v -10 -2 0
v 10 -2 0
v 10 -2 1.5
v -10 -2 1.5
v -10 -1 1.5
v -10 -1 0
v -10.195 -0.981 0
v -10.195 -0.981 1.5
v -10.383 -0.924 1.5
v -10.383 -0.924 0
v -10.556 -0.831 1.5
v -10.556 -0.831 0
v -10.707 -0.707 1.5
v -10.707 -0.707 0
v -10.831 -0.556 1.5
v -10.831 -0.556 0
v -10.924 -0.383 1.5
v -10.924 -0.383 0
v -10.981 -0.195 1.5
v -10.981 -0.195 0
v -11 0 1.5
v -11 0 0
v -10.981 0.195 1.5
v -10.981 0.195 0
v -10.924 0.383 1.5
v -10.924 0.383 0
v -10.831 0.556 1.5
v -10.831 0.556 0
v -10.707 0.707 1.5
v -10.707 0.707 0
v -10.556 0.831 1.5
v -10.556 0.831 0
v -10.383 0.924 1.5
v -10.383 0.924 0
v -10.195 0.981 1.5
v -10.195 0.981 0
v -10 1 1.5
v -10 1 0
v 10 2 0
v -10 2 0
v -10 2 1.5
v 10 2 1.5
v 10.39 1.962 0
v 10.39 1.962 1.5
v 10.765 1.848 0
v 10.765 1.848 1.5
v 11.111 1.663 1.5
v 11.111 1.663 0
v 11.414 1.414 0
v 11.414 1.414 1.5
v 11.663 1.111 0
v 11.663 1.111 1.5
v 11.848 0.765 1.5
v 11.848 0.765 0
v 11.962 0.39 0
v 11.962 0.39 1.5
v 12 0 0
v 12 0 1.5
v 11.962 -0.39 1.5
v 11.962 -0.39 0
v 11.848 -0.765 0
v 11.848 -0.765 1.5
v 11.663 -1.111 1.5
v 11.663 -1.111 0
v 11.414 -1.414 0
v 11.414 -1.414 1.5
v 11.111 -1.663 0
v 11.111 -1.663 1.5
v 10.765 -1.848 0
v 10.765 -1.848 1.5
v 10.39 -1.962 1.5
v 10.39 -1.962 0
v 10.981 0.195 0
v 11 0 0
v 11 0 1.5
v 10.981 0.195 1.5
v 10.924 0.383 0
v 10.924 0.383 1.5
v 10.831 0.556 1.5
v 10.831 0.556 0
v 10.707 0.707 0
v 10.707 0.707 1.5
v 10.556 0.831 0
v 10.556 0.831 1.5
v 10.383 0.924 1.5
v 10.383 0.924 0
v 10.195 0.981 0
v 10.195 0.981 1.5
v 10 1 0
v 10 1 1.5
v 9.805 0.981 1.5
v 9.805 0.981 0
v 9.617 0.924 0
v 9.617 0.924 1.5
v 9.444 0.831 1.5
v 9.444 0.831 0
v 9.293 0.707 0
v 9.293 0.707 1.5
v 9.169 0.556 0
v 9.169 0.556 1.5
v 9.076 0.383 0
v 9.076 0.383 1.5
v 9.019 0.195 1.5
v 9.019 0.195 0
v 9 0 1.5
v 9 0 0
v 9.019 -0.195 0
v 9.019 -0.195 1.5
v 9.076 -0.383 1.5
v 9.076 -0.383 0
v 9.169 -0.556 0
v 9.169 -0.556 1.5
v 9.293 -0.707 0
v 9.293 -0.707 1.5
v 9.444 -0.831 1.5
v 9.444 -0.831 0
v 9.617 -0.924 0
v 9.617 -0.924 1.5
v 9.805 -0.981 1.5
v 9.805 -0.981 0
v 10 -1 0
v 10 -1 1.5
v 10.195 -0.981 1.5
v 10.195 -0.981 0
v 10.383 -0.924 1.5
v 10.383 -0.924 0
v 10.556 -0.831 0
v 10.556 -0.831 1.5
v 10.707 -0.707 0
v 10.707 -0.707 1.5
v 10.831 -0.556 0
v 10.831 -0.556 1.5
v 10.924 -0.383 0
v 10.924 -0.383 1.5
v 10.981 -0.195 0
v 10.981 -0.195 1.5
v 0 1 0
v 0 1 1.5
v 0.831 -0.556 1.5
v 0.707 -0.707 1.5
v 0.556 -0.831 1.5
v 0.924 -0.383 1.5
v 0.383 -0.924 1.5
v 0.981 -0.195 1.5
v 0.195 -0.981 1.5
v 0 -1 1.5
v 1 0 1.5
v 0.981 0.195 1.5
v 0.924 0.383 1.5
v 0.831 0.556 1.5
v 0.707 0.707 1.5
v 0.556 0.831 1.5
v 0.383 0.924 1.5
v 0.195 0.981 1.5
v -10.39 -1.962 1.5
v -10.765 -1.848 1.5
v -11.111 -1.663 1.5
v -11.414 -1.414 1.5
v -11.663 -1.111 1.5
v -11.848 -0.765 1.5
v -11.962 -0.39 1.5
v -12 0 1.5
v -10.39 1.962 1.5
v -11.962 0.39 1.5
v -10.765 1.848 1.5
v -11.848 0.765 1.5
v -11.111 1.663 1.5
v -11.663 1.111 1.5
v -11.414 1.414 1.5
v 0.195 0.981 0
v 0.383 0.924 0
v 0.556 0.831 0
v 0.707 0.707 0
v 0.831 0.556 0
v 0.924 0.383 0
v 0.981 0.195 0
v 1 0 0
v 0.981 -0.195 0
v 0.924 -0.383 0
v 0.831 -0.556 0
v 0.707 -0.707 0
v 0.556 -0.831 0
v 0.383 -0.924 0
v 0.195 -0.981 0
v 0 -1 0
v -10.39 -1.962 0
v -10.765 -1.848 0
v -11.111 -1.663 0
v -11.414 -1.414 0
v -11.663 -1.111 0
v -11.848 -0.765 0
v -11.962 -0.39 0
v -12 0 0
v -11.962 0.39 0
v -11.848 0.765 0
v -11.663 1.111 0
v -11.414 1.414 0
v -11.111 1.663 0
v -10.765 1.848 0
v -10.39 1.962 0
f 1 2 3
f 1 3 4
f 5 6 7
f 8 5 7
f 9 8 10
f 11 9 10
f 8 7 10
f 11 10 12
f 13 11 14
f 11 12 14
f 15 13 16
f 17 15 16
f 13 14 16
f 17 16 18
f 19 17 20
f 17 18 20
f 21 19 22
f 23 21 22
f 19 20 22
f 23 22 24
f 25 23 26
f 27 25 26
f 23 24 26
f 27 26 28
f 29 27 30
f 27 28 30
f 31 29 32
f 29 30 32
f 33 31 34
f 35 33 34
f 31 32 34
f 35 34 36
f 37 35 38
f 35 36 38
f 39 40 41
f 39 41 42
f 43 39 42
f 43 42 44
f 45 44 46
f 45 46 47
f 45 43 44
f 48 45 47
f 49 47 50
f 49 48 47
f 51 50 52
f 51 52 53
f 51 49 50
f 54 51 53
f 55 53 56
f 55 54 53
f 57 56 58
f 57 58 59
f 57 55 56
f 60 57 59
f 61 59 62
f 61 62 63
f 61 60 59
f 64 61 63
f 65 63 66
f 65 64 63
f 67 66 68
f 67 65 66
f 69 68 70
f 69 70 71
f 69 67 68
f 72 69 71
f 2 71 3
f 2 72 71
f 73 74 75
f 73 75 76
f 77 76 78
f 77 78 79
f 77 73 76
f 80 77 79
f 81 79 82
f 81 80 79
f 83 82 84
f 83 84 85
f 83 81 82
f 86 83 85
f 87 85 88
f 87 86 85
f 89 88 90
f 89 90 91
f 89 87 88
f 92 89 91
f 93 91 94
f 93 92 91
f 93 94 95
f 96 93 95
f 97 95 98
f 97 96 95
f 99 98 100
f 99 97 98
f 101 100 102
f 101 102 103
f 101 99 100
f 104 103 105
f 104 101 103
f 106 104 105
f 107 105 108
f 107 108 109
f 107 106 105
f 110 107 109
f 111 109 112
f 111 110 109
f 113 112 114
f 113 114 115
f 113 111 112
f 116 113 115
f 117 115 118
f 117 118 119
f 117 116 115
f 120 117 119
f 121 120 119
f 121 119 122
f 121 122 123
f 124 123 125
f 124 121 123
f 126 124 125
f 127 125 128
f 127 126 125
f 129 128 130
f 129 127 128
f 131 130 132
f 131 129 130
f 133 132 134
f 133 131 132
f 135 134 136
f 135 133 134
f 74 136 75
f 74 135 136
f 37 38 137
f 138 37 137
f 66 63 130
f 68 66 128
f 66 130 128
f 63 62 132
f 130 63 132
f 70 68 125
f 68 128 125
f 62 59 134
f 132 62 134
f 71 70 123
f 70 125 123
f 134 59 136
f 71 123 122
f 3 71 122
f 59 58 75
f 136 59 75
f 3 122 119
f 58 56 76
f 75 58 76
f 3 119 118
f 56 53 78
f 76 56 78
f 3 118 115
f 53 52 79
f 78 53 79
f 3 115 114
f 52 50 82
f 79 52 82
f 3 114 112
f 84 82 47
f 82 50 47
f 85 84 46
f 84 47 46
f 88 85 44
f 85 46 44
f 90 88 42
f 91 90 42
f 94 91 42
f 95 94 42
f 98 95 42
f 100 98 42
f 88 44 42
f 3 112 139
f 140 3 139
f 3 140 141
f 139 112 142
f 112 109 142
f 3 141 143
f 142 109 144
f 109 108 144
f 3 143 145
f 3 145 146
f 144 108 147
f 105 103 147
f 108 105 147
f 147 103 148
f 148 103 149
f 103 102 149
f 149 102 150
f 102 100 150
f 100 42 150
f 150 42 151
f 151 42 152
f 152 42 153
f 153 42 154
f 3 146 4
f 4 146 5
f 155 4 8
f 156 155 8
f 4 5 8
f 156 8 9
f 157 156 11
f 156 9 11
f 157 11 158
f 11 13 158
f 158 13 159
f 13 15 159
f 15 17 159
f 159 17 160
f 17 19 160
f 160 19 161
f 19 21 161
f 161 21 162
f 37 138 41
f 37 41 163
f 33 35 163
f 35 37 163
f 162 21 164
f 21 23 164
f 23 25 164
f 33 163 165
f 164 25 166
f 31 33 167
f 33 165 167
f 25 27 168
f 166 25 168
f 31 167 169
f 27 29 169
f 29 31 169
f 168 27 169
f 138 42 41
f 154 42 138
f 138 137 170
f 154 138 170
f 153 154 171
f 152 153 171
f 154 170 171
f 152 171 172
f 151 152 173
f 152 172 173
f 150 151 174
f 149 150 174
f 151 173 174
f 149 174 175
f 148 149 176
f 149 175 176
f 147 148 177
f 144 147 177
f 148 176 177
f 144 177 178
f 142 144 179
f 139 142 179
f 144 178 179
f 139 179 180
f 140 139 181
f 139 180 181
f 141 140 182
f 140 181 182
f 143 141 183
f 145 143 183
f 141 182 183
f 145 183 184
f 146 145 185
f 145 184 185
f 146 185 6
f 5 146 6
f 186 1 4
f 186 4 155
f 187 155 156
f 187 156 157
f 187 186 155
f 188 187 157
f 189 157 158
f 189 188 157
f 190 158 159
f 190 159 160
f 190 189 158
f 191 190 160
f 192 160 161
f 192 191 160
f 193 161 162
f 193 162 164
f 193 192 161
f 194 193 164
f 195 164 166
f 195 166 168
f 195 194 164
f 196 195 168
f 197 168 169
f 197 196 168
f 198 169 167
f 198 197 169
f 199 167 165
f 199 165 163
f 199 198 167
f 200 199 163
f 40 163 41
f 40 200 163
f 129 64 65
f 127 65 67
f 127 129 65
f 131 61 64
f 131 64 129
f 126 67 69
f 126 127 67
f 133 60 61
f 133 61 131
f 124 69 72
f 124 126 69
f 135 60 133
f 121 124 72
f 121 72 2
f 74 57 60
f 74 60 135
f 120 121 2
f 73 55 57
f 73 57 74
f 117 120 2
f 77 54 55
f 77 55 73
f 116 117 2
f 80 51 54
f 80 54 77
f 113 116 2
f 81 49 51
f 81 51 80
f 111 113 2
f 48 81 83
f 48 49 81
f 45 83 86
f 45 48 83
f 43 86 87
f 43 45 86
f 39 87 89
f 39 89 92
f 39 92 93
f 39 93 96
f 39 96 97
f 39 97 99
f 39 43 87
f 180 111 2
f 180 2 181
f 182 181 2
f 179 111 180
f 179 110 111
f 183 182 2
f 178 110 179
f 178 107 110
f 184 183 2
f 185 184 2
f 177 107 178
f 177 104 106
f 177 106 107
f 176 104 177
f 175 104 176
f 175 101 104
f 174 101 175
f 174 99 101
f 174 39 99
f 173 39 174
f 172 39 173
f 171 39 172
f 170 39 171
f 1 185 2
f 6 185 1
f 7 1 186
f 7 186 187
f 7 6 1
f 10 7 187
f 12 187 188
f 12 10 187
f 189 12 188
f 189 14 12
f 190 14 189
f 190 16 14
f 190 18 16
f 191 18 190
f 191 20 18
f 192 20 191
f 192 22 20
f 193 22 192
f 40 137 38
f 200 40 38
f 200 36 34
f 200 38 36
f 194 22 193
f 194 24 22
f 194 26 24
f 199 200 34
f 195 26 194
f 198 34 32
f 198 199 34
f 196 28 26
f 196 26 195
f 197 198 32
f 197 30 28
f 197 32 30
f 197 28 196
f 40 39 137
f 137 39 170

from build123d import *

# Parameters (mm, degrees)
SKETCH1_R           = 1
BOSS_EXTRUDE1_DEPTH = 1.5


with BuildPart() as part:
    # Sketch1 → Boss-Extrude1 (new body)
    with BuildSketch(Plane.XY):
        with BuildLine():
            Line((-10, 2), (10, 2))
            ThreePointArc((10, 2), (12, 0), (10, -2))
            Line((10, -2), (-10, -2))
            ThreePointArc((-10, -2), (-12, 0), (-10, 2))
        make_face()
        with Locations((10, 0)):
            Circle(SKETCH1_R, mode=Mode.SUBTRACT)
        with BuildLine():
            Line((-10, 1), (0, 1))
            ThreePointArc((0, 1), (1, 0), (0, -1))
            Line((0, -1), (-10, -1))
            ThreePointArc((-10, -1), (-11, 0), (-10, 1))
        make_face(mode=Mode.SUBTRACT)
    extrude(amount=BOSS_EXTRUDE1_DEPTH)


solid = part.part
